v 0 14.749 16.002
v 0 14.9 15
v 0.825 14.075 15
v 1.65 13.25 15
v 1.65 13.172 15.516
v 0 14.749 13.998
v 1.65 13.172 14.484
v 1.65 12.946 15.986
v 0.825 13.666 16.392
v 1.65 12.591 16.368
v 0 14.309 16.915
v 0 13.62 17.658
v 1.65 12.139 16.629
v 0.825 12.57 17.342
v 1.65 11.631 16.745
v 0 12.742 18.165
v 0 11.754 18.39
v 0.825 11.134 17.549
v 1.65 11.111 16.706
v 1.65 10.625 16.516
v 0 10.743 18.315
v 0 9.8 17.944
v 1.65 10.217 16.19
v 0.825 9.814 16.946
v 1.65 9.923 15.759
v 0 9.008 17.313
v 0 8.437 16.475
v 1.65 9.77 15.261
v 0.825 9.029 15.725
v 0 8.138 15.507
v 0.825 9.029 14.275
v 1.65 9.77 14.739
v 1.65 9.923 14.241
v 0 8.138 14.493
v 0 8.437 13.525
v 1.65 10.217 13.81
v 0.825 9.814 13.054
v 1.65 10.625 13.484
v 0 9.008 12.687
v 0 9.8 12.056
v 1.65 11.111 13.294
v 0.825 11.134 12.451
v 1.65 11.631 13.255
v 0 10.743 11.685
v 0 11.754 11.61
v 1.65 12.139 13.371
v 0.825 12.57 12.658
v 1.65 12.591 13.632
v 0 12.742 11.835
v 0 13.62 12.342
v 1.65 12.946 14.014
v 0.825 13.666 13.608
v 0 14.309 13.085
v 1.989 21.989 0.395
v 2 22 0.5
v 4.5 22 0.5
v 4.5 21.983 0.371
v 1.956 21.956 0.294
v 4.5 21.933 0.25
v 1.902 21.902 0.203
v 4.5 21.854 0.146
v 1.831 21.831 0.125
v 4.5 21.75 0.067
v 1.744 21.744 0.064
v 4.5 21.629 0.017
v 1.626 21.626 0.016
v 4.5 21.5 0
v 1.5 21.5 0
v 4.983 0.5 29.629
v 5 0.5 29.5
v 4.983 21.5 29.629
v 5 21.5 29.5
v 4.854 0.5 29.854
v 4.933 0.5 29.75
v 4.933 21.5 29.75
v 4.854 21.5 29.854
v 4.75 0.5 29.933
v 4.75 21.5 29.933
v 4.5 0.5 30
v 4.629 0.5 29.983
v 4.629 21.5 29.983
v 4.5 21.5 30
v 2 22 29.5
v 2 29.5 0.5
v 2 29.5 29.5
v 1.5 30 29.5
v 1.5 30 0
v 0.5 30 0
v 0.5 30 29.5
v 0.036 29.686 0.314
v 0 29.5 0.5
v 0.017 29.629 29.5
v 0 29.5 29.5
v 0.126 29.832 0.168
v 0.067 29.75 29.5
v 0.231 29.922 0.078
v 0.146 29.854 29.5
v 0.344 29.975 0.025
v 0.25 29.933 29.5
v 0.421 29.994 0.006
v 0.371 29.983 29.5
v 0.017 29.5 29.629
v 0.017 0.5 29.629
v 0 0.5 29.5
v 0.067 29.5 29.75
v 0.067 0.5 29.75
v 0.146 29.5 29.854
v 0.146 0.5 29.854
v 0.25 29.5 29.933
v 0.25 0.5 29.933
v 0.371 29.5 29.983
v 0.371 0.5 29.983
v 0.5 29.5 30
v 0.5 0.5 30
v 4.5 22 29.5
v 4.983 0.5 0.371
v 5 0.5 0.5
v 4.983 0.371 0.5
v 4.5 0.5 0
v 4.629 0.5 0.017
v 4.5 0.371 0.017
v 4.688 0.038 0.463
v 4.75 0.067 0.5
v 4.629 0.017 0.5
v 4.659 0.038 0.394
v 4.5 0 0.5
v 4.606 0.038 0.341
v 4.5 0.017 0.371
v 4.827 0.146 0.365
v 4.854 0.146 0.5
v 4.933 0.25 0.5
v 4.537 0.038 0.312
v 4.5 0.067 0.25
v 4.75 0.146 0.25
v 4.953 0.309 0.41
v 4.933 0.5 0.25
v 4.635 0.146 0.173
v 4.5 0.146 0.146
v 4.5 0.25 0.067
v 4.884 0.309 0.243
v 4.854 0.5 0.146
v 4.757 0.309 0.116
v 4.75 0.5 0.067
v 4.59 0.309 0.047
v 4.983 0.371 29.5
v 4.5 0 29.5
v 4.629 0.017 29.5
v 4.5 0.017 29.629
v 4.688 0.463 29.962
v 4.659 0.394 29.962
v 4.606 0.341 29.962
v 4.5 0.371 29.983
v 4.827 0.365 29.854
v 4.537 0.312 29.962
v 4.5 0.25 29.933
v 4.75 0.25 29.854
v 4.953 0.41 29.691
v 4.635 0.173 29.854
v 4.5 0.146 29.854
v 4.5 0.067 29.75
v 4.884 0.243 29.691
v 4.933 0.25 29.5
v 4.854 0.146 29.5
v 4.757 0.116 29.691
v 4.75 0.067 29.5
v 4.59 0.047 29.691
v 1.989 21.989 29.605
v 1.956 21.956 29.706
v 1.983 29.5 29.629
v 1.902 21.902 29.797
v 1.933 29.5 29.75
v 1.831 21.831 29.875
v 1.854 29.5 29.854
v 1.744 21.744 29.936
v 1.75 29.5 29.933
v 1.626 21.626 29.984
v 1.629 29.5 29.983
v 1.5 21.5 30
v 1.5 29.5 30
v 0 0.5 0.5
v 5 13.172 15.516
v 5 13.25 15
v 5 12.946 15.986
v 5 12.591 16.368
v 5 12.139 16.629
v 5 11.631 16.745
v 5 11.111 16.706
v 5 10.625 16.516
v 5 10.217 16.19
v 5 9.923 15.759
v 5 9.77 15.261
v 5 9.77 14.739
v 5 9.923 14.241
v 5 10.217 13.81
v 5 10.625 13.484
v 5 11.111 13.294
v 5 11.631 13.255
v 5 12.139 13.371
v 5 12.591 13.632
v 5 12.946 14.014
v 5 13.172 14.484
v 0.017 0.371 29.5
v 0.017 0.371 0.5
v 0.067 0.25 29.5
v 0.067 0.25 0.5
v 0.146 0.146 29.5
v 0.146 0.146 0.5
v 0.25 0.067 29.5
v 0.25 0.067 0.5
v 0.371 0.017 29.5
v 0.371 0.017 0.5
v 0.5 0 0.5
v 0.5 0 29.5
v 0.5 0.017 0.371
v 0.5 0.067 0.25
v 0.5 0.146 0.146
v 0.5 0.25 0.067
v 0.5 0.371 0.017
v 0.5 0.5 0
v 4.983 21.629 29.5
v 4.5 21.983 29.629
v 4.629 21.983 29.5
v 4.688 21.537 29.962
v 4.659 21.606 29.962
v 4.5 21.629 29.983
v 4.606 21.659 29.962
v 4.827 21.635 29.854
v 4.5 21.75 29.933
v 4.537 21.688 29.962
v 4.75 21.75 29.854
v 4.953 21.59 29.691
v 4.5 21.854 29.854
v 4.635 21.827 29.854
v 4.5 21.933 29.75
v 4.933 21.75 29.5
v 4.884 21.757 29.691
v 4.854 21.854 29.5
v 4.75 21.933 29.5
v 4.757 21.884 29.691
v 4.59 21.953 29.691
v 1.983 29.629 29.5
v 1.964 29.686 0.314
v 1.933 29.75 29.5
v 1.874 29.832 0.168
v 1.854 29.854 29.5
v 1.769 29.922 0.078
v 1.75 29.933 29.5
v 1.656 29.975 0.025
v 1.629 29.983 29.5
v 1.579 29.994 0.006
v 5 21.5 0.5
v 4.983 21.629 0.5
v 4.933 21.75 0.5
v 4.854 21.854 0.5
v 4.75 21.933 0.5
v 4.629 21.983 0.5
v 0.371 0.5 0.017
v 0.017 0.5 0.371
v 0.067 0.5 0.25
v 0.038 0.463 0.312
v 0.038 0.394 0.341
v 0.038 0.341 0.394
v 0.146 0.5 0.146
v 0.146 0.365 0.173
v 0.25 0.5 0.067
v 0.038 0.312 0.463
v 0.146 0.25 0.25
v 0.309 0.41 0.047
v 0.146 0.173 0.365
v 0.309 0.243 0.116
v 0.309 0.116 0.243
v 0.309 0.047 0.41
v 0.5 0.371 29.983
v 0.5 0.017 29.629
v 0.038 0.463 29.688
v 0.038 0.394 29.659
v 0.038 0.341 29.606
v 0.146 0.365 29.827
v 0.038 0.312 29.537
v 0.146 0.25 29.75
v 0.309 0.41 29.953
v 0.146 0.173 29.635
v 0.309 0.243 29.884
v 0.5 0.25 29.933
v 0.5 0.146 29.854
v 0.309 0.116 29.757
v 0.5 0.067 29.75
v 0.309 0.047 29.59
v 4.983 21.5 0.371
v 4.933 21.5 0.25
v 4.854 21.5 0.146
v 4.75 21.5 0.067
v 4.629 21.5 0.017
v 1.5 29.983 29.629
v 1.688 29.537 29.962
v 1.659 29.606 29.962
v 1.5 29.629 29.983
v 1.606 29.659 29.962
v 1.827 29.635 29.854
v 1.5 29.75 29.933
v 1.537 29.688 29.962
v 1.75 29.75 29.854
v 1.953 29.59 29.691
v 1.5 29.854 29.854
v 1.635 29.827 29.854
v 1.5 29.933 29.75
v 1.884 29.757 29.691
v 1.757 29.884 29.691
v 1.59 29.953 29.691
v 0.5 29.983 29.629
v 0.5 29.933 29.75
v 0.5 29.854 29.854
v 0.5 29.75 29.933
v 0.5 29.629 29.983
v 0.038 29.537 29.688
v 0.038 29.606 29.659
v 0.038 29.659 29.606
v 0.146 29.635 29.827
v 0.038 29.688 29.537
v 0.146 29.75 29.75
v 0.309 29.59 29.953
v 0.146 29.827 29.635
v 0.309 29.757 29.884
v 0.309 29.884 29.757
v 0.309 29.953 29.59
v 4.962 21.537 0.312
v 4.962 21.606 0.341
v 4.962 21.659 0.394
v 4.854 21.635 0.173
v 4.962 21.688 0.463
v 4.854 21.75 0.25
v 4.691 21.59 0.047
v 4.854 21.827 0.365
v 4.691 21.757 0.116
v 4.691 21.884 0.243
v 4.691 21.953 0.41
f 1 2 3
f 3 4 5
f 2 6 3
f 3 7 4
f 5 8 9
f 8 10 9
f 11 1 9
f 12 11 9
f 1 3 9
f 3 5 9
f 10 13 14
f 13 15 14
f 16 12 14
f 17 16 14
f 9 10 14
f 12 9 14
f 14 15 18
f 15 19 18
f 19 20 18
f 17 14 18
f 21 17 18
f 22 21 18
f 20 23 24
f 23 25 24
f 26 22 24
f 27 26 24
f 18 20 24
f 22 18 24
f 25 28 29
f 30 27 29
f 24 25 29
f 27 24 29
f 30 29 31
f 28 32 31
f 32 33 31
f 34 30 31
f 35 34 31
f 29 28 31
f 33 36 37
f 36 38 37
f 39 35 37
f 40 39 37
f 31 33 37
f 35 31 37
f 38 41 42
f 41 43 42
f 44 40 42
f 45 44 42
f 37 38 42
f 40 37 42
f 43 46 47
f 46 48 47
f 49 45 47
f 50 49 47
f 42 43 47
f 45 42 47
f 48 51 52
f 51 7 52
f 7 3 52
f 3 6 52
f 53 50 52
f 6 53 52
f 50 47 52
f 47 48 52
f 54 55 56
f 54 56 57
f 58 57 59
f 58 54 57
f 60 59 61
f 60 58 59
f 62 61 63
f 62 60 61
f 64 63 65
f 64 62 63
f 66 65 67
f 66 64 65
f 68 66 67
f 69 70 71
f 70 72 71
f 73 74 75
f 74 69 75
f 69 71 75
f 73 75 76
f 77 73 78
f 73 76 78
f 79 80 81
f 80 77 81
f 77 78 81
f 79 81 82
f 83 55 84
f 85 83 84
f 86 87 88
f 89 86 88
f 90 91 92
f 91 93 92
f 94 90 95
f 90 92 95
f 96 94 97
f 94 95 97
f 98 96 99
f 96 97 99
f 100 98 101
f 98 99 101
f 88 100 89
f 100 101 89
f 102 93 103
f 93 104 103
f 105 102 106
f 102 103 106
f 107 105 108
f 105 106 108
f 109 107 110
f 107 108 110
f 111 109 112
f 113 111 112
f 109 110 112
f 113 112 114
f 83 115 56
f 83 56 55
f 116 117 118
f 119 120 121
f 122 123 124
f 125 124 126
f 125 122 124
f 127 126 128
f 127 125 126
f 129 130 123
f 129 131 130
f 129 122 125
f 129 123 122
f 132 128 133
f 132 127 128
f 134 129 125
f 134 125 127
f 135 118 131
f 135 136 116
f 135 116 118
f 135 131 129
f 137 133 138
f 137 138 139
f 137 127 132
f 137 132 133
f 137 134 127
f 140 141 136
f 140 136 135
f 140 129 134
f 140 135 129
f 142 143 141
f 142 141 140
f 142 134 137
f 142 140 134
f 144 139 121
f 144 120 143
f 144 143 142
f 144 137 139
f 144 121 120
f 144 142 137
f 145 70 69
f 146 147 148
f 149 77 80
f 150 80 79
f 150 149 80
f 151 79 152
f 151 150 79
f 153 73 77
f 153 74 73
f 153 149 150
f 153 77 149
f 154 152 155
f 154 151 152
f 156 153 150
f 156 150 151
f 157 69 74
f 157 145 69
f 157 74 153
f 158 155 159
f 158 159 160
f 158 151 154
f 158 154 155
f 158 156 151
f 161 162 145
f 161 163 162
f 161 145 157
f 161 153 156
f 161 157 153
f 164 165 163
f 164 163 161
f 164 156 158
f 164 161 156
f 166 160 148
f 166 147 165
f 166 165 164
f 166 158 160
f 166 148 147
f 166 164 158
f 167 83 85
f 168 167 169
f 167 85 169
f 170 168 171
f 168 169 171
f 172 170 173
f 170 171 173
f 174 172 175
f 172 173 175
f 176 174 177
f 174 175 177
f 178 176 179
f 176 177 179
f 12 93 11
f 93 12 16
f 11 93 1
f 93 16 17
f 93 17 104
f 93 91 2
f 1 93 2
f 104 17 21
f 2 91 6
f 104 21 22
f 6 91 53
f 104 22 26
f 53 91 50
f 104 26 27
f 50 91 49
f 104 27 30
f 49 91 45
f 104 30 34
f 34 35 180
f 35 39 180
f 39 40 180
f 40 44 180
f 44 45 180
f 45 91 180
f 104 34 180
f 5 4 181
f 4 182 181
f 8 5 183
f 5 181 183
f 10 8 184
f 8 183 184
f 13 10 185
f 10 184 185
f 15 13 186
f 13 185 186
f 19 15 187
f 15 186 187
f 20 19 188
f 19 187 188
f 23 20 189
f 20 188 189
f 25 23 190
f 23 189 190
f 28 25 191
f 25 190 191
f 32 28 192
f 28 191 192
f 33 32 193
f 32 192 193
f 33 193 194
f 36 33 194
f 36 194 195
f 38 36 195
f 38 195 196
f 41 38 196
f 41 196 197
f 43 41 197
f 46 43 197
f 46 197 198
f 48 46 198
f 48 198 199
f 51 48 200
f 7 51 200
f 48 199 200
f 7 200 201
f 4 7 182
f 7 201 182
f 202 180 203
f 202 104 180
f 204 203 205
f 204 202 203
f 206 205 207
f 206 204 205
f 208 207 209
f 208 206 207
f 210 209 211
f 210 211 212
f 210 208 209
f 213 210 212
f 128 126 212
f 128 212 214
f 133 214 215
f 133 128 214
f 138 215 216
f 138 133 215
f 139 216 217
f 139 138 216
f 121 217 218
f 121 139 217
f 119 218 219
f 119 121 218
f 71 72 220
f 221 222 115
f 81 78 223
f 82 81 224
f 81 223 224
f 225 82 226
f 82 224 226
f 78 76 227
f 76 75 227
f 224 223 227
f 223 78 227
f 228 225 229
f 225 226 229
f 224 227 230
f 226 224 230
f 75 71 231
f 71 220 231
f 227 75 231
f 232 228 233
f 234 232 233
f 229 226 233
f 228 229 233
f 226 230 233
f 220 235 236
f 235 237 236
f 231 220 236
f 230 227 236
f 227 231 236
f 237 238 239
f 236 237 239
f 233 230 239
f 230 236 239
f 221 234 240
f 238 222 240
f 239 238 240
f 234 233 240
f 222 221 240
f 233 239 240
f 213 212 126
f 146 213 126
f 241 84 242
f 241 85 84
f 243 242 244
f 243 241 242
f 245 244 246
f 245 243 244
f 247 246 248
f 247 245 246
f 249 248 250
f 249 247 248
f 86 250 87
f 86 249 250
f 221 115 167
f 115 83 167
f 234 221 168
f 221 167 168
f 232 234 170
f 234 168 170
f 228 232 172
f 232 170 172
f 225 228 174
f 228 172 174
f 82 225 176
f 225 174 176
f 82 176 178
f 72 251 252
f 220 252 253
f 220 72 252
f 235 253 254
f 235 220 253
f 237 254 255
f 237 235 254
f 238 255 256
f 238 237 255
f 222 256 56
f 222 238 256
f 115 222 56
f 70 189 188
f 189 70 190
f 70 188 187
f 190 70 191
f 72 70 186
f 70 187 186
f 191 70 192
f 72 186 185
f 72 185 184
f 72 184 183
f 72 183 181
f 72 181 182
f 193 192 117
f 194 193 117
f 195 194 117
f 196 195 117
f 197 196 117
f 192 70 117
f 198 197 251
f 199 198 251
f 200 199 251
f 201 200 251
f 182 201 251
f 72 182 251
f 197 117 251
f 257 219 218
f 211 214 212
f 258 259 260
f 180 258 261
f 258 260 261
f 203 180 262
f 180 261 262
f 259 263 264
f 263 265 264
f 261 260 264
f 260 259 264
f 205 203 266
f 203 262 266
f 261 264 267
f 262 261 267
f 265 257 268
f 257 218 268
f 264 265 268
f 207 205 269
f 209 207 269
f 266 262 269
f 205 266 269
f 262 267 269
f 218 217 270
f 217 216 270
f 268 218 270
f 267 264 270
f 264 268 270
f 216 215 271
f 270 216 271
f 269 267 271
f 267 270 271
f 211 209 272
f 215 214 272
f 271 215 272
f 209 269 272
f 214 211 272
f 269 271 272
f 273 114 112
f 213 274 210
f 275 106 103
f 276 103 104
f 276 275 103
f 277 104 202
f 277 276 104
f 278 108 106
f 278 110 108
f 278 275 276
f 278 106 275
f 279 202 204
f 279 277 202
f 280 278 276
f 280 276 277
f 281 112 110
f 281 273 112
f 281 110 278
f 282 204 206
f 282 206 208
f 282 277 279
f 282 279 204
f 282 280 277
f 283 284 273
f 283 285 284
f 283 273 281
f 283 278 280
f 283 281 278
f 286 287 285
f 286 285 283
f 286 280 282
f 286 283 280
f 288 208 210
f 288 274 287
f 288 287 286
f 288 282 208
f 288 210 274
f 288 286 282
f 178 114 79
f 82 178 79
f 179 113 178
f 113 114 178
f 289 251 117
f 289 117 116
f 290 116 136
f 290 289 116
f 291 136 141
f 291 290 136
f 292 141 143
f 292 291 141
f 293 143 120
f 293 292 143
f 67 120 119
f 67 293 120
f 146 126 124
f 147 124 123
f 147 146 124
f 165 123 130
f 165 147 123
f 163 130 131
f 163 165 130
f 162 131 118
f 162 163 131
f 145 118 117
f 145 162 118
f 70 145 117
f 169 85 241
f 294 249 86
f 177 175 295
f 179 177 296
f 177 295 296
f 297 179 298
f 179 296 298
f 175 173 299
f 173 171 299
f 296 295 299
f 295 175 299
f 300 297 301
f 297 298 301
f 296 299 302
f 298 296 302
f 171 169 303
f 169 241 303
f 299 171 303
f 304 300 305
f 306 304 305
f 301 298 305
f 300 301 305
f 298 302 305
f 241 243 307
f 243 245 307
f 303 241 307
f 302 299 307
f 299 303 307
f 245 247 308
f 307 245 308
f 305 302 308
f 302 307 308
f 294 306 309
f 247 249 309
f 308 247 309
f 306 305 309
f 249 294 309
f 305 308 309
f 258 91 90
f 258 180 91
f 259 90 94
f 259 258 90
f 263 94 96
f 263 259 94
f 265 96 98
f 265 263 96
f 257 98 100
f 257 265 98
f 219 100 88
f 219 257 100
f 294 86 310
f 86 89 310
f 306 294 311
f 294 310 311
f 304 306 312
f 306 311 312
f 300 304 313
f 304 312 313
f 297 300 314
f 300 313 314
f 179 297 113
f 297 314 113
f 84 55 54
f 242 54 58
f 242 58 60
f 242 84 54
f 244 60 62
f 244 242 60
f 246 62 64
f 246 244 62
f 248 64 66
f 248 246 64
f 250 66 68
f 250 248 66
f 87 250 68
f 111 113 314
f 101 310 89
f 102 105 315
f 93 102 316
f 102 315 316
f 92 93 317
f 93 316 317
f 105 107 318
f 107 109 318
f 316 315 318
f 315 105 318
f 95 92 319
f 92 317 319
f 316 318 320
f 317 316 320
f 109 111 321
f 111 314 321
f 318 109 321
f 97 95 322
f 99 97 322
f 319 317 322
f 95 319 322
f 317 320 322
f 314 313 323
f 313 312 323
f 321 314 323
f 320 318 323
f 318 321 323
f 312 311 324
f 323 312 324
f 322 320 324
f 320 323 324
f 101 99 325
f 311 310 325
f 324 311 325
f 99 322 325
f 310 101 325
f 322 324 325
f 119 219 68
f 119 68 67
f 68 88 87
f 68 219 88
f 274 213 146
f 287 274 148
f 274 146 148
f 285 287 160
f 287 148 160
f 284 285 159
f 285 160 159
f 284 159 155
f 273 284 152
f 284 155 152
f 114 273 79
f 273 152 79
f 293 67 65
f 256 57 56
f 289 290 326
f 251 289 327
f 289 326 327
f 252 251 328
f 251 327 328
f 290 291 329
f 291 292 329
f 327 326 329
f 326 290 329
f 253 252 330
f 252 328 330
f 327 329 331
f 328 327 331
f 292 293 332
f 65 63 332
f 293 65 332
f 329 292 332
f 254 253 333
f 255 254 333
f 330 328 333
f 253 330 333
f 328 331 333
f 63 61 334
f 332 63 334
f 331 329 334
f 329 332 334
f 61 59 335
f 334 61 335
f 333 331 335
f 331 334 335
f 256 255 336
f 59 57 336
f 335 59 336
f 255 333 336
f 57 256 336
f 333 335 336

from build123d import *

# Parameters (mm, degrees)
F1_DEPTH       = 30
F2_R           = 0.5
F4_D           = 3.5
F4_CSINK_D     = 6.8
F4_CSINK_ANGLE = 90


with BuildPart() as f1:
    # F0 (on Top) → F1 (new body)
    with BuildSketch(Plane.XY):
        Polygon((0, 30), (0, 0), (5, 0), (5, 22), (2, 22), (2, 30), align=None)
    extrude(amount=F1_DEPTH)

    # F2
    f2_edges = [f1.edges().sort_by_distance(p)[0] for p in [
        (2, 30, 15),
        (2, 26, 0),
        (3.5, 22, 0),
        (5, 11, 0),
        (5, 0, 15),
        (2, 26, 30),
        (5, 22, 15),
        (5, 11, 30),
        (3.5, 22, 30),
        (1, 30, 30),
        (2.5, 0, 30),
        (2.5, 0, 0),
        (0, 15, 0),
        (0, 15, 30),
        (0, 30, 15),
        (0, 0, 15),
    ]]
    fillet(f2_edges, radius=F2_R)

    # F4 (through all)
    with Locations(Plane(origin=(0, 0, 0), x_dir=(0, -1, 0), z_dir=(-1, 0, 0))):
        with Locations((-11.5, 15)):
            CounterSinkHole(F4_D / 2, F4_CSINK_D / 2, counter_sink_angle=F4_CSINK_ANGLE)


solid = f1.part
